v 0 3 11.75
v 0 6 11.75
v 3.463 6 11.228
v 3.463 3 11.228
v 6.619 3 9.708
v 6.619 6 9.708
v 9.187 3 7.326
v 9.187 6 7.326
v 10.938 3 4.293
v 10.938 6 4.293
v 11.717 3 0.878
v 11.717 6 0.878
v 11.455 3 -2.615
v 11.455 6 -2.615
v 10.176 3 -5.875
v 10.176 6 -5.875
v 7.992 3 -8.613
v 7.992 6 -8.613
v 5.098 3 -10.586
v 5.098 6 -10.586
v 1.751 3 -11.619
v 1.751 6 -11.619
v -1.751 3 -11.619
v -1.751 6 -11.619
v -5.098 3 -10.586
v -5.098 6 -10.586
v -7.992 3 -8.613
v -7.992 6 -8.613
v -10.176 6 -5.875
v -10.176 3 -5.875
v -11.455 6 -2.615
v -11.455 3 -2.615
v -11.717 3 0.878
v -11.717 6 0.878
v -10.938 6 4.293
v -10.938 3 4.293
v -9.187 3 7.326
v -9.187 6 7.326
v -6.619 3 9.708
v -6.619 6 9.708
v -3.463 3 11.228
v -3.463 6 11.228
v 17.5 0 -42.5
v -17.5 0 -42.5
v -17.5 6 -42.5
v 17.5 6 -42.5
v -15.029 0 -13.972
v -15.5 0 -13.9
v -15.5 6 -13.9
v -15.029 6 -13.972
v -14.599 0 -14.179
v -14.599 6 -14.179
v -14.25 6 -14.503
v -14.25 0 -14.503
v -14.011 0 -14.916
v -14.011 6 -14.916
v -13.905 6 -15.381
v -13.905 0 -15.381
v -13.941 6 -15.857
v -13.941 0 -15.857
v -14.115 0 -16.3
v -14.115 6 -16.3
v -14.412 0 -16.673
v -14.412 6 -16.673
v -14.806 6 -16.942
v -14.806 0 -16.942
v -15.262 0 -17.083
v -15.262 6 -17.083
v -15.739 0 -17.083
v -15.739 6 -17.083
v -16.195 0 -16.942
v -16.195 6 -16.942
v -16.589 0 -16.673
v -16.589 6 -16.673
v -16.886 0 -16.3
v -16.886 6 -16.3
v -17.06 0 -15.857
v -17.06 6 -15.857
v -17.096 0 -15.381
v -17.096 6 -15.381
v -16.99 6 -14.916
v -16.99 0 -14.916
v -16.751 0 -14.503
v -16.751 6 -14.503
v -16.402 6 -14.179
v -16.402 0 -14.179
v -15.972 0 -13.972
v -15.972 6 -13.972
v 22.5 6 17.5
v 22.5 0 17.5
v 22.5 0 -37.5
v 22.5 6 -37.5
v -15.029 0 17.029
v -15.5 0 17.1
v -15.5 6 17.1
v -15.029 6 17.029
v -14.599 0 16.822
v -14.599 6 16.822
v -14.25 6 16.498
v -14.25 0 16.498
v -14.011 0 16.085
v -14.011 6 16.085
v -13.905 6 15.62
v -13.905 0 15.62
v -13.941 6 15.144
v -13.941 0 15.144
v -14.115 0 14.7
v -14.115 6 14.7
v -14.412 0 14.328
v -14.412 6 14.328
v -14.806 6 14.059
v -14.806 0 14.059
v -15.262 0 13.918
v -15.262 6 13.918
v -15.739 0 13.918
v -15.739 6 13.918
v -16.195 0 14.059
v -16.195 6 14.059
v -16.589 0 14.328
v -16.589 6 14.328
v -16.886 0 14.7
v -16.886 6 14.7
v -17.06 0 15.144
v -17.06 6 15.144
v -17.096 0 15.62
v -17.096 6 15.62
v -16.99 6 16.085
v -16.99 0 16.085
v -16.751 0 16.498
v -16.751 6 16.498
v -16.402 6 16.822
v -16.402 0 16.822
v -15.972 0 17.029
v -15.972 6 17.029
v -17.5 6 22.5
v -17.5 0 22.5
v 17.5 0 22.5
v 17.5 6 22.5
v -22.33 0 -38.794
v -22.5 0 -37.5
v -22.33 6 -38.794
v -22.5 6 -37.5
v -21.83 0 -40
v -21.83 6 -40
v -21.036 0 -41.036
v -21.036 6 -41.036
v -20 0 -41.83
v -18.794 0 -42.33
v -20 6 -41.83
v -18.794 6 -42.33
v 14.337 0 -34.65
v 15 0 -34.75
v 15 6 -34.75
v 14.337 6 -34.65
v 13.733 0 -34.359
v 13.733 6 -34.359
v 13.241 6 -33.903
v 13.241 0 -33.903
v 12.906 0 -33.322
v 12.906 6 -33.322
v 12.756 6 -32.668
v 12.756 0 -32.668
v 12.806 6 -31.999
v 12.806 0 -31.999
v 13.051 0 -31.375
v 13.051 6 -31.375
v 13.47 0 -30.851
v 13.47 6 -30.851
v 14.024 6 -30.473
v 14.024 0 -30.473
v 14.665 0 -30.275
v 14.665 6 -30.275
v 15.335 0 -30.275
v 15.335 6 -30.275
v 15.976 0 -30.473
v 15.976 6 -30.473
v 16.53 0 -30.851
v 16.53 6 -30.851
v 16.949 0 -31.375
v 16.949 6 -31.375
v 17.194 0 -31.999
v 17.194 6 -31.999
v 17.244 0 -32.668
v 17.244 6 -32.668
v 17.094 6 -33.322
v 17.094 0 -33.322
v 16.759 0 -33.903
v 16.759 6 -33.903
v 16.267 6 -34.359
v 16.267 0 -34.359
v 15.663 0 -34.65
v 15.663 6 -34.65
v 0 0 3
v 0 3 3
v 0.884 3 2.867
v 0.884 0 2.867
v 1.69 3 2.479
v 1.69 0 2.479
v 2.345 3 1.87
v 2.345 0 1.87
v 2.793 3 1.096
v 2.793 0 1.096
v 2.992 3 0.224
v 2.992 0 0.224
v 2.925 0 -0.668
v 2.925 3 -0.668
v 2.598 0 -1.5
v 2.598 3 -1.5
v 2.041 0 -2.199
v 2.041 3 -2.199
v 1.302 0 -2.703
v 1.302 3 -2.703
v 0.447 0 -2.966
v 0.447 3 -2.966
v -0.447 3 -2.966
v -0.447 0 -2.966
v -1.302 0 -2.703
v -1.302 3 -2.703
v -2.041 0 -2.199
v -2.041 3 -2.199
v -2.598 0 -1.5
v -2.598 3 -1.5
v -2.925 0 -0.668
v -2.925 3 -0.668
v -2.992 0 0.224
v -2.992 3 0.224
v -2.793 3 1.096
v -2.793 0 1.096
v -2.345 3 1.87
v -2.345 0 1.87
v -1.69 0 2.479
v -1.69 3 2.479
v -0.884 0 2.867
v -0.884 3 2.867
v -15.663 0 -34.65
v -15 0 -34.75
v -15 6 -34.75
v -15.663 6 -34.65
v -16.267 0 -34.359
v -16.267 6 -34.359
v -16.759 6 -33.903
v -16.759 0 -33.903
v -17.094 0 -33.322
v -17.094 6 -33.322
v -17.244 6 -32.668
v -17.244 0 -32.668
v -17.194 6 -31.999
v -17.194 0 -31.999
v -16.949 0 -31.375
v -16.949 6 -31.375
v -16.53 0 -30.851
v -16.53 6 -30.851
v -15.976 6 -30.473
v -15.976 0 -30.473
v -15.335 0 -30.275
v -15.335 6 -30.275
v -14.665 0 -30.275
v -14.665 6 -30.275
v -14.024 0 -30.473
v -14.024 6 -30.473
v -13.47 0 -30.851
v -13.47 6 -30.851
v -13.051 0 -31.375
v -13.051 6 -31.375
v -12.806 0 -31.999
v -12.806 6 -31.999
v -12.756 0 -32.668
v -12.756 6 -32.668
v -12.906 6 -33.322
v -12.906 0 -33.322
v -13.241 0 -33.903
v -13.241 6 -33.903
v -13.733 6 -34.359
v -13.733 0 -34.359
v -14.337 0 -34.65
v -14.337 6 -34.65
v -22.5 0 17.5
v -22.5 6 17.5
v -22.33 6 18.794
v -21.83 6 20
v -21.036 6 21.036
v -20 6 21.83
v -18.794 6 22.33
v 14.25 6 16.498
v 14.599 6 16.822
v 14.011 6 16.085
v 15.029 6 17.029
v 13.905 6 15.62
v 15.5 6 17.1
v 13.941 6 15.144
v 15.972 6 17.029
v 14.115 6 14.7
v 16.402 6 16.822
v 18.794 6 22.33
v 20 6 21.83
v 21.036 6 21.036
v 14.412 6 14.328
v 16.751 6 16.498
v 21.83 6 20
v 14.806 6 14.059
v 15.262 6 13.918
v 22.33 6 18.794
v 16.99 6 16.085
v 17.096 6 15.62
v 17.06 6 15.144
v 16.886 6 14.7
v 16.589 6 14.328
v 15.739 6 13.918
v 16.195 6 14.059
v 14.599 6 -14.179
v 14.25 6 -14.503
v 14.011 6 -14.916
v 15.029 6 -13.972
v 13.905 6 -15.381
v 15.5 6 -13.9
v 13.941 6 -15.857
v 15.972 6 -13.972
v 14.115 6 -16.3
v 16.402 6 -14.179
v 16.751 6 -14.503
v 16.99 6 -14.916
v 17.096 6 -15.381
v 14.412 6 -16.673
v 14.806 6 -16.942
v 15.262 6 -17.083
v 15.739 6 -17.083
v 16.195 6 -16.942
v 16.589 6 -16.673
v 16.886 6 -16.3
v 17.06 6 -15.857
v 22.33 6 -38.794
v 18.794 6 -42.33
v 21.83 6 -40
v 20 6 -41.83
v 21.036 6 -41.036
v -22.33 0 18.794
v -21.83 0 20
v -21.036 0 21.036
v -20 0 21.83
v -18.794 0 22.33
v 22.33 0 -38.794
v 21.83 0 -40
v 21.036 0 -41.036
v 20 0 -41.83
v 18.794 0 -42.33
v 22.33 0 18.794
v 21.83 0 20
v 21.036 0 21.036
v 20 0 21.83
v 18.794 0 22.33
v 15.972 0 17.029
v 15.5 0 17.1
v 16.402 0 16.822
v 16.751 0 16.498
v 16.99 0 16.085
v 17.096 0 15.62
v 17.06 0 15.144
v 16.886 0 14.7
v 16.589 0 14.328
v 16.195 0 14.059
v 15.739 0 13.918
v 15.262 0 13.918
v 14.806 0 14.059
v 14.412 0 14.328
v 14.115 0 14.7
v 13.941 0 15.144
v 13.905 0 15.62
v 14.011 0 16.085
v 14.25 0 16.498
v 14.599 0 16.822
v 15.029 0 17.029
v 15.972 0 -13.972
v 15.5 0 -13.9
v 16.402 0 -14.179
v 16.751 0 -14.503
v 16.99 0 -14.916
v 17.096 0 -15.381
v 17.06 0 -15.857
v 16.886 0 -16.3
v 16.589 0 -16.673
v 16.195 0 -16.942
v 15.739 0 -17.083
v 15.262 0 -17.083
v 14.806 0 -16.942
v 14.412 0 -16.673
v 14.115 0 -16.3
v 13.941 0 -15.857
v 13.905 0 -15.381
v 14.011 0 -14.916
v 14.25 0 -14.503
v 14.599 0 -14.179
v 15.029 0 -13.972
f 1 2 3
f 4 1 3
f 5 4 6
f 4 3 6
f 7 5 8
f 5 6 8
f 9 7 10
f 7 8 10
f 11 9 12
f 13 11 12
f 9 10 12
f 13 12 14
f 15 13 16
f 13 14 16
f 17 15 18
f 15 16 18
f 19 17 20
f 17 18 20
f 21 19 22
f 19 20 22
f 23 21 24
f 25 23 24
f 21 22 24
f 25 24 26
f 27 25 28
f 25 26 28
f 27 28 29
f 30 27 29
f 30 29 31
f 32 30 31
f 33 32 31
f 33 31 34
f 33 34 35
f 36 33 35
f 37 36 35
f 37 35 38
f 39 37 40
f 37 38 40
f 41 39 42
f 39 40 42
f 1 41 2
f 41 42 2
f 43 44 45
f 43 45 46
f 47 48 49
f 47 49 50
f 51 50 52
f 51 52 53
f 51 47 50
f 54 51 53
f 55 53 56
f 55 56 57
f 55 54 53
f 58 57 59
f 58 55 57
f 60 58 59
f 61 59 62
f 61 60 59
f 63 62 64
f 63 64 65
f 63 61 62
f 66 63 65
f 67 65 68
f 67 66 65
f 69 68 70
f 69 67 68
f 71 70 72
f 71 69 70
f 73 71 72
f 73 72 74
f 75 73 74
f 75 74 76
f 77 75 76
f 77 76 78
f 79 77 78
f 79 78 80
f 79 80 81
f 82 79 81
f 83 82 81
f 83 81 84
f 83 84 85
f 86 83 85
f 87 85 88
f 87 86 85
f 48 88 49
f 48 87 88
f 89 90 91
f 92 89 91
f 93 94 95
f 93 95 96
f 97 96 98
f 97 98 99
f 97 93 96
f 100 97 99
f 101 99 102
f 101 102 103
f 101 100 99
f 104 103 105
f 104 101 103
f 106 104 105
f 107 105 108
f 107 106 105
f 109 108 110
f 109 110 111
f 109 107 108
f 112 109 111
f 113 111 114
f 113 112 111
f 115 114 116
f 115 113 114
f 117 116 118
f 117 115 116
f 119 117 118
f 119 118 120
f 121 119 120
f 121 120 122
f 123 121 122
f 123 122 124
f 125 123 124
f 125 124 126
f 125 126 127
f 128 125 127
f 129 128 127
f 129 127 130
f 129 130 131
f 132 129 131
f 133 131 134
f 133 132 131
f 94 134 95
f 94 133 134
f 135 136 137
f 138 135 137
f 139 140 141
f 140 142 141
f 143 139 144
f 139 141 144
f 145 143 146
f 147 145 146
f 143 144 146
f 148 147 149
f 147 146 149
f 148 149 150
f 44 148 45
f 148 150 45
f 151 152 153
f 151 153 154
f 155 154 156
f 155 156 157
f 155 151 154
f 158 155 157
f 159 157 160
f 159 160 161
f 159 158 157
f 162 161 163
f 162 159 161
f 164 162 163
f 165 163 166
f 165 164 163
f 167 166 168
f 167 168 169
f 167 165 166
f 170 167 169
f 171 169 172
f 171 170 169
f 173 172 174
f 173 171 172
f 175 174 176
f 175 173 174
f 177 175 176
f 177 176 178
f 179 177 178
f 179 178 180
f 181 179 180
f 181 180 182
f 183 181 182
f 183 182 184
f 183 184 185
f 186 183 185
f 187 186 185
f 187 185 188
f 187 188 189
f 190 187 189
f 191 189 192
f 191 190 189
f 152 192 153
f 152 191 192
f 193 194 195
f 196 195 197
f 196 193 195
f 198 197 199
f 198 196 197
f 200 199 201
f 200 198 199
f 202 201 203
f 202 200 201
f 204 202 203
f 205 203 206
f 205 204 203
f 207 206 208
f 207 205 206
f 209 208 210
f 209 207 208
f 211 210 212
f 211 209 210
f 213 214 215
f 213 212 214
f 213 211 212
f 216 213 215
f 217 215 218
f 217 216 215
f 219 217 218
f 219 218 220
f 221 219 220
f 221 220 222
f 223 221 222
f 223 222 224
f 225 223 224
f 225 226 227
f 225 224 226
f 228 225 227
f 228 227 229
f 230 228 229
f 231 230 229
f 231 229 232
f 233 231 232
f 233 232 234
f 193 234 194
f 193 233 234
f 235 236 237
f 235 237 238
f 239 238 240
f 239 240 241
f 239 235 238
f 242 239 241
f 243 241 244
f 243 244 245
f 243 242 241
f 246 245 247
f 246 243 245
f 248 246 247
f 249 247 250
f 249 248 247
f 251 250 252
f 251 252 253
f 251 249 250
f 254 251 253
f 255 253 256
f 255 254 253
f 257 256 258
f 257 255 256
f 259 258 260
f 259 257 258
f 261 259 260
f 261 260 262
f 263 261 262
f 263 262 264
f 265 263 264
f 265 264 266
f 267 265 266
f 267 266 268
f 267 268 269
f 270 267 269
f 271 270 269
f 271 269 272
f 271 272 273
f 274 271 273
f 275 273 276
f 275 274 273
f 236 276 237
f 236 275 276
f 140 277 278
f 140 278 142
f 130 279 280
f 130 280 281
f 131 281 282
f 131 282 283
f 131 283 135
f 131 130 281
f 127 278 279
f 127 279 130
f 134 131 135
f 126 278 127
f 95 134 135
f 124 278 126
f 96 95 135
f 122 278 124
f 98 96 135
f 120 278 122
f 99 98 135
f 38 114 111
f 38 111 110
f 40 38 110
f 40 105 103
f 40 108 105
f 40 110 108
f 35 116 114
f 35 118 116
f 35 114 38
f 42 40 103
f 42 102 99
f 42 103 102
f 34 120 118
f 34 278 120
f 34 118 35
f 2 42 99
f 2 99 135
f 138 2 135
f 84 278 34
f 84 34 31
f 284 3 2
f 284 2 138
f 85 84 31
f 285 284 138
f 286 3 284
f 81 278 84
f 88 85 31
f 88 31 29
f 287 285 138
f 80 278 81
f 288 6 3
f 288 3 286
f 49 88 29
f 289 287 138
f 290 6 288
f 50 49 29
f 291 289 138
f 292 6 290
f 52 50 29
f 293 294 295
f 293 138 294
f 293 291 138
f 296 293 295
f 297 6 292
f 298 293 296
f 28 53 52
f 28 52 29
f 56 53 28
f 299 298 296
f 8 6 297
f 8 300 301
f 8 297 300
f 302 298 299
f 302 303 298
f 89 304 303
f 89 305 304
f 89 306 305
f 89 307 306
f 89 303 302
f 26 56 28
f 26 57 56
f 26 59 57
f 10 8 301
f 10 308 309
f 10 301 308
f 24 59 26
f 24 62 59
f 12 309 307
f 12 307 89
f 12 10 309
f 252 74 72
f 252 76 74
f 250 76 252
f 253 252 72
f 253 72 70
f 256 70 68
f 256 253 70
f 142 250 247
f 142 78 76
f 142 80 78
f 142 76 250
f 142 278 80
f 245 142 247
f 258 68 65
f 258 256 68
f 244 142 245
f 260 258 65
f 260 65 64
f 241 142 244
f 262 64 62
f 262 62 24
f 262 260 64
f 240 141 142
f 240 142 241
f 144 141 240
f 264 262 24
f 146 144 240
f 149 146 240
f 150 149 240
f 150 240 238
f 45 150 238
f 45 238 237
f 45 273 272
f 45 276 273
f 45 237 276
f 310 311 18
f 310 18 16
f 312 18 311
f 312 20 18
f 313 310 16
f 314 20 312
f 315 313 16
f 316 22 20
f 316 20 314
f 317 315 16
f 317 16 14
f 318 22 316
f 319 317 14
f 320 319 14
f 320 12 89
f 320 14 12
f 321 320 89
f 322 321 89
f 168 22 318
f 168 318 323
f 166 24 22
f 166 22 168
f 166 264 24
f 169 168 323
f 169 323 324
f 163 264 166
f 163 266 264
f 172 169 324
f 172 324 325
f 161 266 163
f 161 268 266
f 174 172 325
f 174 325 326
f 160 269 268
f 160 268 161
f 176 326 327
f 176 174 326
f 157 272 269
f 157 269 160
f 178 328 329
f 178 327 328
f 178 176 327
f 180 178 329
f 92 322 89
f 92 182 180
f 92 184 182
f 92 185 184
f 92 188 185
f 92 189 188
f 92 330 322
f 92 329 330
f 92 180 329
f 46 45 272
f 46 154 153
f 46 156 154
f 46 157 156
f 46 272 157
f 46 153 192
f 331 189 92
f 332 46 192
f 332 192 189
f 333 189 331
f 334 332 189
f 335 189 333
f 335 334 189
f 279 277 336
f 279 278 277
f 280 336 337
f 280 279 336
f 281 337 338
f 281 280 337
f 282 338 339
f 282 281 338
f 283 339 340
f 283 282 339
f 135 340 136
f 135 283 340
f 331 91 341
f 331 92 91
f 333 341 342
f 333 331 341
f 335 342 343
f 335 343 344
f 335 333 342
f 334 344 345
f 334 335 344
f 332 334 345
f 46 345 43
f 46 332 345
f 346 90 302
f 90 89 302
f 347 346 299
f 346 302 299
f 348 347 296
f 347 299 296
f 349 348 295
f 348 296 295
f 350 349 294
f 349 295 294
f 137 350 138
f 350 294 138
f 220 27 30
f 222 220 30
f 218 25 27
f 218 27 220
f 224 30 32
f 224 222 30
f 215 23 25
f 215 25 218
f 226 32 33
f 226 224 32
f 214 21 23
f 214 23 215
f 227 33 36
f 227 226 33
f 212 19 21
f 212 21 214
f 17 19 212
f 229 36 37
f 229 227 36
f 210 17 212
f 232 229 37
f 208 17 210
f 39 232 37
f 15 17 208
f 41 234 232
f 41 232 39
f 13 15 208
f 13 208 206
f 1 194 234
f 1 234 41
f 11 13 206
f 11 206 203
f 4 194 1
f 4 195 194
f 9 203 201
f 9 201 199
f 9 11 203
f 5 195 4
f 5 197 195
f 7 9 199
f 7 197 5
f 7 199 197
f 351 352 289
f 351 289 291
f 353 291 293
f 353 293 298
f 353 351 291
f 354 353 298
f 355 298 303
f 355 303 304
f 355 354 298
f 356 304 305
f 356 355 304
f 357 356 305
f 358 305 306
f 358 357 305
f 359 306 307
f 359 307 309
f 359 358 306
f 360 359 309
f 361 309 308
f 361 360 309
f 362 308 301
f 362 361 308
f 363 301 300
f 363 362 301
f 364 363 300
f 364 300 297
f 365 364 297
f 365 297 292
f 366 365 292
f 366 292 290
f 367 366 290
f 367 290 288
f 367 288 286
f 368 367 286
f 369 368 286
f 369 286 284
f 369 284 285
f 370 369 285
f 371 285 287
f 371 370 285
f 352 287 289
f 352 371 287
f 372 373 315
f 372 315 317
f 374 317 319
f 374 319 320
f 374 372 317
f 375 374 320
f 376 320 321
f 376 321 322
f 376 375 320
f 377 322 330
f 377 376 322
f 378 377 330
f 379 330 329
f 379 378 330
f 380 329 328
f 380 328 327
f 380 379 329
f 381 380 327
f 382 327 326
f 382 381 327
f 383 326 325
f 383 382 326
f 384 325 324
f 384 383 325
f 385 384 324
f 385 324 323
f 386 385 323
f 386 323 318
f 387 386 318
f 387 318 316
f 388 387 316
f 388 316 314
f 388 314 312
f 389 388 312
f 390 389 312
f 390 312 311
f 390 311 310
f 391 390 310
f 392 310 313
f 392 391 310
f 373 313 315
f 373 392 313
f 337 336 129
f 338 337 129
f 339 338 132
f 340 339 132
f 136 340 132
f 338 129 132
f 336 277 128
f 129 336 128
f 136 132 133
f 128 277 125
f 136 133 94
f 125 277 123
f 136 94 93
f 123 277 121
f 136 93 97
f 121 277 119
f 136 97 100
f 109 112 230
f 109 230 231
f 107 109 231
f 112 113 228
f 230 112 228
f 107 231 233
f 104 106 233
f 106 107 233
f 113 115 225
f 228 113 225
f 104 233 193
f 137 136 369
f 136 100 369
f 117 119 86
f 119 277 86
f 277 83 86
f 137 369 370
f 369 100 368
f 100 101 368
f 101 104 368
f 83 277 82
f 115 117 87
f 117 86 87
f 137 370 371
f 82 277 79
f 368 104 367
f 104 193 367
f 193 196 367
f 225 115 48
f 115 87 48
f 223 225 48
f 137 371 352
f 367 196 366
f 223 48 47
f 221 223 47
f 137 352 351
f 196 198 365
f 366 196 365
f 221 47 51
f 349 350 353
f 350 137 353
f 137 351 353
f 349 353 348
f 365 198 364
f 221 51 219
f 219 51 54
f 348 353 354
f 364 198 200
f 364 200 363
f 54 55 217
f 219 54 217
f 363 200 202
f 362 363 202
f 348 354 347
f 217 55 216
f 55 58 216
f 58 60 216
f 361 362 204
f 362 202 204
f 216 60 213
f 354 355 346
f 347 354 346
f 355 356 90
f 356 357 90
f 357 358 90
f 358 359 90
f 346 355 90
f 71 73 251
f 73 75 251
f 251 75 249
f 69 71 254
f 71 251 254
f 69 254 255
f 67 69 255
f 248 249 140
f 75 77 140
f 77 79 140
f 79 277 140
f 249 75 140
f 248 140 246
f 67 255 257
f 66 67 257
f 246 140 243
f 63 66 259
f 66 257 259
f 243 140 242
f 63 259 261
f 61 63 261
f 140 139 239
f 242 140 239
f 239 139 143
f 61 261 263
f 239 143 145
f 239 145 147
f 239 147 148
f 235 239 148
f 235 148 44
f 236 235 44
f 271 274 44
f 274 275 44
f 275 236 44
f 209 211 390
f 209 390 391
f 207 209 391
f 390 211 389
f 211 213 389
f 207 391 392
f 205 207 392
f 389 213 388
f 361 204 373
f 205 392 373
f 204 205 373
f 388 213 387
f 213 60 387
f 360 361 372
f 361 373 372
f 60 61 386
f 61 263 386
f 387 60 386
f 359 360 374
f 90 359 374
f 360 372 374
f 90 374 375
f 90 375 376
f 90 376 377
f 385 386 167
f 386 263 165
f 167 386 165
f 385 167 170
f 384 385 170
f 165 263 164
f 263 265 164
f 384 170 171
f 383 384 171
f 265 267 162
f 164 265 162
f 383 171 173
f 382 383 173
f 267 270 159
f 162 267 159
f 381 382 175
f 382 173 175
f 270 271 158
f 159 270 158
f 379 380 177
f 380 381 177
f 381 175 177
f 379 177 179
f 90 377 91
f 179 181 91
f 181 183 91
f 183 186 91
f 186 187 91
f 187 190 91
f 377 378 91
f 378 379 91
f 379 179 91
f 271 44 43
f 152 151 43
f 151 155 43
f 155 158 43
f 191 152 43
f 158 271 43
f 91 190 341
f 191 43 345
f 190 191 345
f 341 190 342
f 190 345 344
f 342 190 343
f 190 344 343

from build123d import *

# Parameters (mm, degrees)
SKETCH1_W           = 45
SKETCH1_H           = 45
SKETCH1_R           = 3
SKETCH1_R_2         = 1.6
BOSS_EXTRUDE1_DEPTH = 6
SKETCH2_R           = 11.75
CUT_EXTRUDE1_DEPTH  = 3
SKETCH5_W           = 45
SKETCH5_H           = 20
SKETCH5_R           = 2.25
BOSS_EXTRUDE2_DEPTH = 6
FILLET1_R           = 5


with BuildPart() as part:
    # Sketch1 → Boss-Extrude1 (new body)
    with BuildSketch(Plane(origin=(0, 0, 0), x_dir=(1, 0, 0), z_dir=(0, 1, 0))):
        Rectangle(SKETCH1_W, SKETCH1_H)
        with Locations(Location((0, 0, 0), (0, 0, 270))):
            Circle(SKETCH1_R, mode=Mode.SUBTRACT)
        with Locations(Location((-15.50048775, 15.50048775, 0), (0, 0, 270))):
            Circle(SKETCH1_R_2, mode=Mode.SUBTRACT)
        with Locations(Location((15.50048775, 15.50048775, 0), (0, 0, 270))):
            Circle(SKETCH1_R_2, mode=Mode.SUBTRACT)
        with Locations(Location((15.50048775, -15.50048775, 0), (0, 0, 270))):
            Circle(SKETCH1_R_2, mode=Mode.SUBTRACT)
        with Locations(Location((-15.50048775, -15.50048775, 0), (0, 0, 270))):
            Circle(SKETCH1_R_2, mode=Mode.SUBTRACT)
    extrude(amount=BOSS_EXTRUDE1_DEPTH)

    # Sketch2 → Cut-Extrude1 (cut)
    with BuildSketch(Plane(origin=(0, 6, 0), x_dir=(1, 0, 0), z_dir=(0, 1, 0))):
        with Locations(Location((0, 0, 0), (0, 0, 270))):
            Circle(SKETCH2_R)
    extrude(amount=-CUT_EXTRUDE1_DEPTH, mode=Mode.SUBTRACT)

    # Sketch5 → Boss-Extrude2 (add)
    with BuildSketch(Plane(origin=(0, 0, 0), x_dir=(1, 0, 0), z_dir=(0, 1, 0))):
        with Locations((0, 32.5)):
            Rectangle(SKETCH5_W, SKETCH5_H)
        with Locations(Location((-15, 32.5, 0), (0, 0, 90))):
            Circle(SKETCH5_R, mode=Mode.SUBTRACT)
        with Locations(Location((15, 32.5, 0), (0, 0, 90))):
            Circle(SKETCH5_R, mode=Mode.SUBTRACT)
    extrude(amount=BOSS_EXTRUDE2_DEPTH)

    # Fillet1
    fillet1_edges = [part.edges().sort_by_distance(p)[0] for p in [
        (-22.5, 3, -42.5),
        (22.5, 3, -42.5),
        (22.5, 3, 22.5),
        (-22.5, 3, 22.5),
    ]]
    fillet(fillet1_edges, radius=FILLET1_R)


solid = part.part
